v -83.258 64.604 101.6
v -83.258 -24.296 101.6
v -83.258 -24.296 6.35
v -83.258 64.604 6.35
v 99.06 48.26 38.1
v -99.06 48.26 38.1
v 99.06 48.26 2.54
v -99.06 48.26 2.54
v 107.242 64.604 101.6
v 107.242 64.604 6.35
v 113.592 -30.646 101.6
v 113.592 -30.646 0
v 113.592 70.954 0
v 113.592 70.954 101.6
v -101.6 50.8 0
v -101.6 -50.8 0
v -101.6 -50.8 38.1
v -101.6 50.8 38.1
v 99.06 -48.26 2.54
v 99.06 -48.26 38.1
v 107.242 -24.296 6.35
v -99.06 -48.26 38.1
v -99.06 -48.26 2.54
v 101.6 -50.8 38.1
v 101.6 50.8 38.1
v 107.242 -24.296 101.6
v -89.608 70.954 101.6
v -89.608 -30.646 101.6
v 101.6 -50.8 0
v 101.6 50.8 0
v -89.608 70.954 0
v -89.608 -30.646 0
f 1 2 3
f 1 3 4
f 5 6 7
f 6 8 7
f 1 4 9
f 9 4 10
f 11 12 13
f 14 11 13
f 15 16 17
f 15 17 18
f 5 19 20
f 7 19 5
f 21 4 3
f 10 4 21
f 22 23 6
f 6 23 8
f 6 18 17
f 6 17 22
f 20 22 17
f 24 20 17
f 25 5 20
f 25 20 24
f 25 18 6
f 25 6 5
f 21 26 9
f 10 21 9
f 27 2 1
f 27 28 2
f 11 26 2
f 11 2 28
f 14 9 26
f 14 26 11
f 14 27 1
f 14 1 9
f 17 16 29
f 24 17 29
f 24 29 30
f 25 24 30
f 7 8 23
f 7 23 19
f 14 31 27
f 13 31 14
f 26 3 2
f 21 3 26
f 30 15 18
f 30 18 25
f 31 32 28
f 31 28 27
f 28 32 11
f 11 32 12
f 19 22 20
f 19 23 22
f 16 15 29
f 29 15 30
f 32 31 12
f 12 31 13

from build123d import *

# Parameters (mm, degrees)
F0_W     = 203.2
F0_H     = 101.6
F1_DEPTH = 101.6
F2_T     = -6.35
F3_W     = 203.2
F3_H     = 101.6
F4_DEPTH = 38.1
F5_T     = -2.54


with BuildPart() as f1:
    # F0 (on Top) → F1 (new body)
    with BuildSketch(Plane.XY):
        with Locations((11.992132, 20.154061)):
            Rectangle(F0_W, F0_H)
    extrude(amount=F1_DEPTH)

    # F2
    f2_openings = [f1.faces().sort_by_distance(p)[0] for p in [
        (11.992132, 20.154061, 101.6),
    ]]
    offset(amount=F2_T, openings=f2_openings)


with BuildPart() as f4:
    # F3 (on Top) → F4 (new body)
    with BuildSketch(Plane.XY):
        Rectangle(F3_W, F3_H)
    extrude(amount=F4_DEPTH)

    # F5
    f5_openings = [f4.faces().sort_by_distance(p)[0] for p in [
        (0, 0, 38.1),
    ]]
    offset(amount=F5_T, openings=f5_openings)


solid = Compound([f1.part, f4.part])
